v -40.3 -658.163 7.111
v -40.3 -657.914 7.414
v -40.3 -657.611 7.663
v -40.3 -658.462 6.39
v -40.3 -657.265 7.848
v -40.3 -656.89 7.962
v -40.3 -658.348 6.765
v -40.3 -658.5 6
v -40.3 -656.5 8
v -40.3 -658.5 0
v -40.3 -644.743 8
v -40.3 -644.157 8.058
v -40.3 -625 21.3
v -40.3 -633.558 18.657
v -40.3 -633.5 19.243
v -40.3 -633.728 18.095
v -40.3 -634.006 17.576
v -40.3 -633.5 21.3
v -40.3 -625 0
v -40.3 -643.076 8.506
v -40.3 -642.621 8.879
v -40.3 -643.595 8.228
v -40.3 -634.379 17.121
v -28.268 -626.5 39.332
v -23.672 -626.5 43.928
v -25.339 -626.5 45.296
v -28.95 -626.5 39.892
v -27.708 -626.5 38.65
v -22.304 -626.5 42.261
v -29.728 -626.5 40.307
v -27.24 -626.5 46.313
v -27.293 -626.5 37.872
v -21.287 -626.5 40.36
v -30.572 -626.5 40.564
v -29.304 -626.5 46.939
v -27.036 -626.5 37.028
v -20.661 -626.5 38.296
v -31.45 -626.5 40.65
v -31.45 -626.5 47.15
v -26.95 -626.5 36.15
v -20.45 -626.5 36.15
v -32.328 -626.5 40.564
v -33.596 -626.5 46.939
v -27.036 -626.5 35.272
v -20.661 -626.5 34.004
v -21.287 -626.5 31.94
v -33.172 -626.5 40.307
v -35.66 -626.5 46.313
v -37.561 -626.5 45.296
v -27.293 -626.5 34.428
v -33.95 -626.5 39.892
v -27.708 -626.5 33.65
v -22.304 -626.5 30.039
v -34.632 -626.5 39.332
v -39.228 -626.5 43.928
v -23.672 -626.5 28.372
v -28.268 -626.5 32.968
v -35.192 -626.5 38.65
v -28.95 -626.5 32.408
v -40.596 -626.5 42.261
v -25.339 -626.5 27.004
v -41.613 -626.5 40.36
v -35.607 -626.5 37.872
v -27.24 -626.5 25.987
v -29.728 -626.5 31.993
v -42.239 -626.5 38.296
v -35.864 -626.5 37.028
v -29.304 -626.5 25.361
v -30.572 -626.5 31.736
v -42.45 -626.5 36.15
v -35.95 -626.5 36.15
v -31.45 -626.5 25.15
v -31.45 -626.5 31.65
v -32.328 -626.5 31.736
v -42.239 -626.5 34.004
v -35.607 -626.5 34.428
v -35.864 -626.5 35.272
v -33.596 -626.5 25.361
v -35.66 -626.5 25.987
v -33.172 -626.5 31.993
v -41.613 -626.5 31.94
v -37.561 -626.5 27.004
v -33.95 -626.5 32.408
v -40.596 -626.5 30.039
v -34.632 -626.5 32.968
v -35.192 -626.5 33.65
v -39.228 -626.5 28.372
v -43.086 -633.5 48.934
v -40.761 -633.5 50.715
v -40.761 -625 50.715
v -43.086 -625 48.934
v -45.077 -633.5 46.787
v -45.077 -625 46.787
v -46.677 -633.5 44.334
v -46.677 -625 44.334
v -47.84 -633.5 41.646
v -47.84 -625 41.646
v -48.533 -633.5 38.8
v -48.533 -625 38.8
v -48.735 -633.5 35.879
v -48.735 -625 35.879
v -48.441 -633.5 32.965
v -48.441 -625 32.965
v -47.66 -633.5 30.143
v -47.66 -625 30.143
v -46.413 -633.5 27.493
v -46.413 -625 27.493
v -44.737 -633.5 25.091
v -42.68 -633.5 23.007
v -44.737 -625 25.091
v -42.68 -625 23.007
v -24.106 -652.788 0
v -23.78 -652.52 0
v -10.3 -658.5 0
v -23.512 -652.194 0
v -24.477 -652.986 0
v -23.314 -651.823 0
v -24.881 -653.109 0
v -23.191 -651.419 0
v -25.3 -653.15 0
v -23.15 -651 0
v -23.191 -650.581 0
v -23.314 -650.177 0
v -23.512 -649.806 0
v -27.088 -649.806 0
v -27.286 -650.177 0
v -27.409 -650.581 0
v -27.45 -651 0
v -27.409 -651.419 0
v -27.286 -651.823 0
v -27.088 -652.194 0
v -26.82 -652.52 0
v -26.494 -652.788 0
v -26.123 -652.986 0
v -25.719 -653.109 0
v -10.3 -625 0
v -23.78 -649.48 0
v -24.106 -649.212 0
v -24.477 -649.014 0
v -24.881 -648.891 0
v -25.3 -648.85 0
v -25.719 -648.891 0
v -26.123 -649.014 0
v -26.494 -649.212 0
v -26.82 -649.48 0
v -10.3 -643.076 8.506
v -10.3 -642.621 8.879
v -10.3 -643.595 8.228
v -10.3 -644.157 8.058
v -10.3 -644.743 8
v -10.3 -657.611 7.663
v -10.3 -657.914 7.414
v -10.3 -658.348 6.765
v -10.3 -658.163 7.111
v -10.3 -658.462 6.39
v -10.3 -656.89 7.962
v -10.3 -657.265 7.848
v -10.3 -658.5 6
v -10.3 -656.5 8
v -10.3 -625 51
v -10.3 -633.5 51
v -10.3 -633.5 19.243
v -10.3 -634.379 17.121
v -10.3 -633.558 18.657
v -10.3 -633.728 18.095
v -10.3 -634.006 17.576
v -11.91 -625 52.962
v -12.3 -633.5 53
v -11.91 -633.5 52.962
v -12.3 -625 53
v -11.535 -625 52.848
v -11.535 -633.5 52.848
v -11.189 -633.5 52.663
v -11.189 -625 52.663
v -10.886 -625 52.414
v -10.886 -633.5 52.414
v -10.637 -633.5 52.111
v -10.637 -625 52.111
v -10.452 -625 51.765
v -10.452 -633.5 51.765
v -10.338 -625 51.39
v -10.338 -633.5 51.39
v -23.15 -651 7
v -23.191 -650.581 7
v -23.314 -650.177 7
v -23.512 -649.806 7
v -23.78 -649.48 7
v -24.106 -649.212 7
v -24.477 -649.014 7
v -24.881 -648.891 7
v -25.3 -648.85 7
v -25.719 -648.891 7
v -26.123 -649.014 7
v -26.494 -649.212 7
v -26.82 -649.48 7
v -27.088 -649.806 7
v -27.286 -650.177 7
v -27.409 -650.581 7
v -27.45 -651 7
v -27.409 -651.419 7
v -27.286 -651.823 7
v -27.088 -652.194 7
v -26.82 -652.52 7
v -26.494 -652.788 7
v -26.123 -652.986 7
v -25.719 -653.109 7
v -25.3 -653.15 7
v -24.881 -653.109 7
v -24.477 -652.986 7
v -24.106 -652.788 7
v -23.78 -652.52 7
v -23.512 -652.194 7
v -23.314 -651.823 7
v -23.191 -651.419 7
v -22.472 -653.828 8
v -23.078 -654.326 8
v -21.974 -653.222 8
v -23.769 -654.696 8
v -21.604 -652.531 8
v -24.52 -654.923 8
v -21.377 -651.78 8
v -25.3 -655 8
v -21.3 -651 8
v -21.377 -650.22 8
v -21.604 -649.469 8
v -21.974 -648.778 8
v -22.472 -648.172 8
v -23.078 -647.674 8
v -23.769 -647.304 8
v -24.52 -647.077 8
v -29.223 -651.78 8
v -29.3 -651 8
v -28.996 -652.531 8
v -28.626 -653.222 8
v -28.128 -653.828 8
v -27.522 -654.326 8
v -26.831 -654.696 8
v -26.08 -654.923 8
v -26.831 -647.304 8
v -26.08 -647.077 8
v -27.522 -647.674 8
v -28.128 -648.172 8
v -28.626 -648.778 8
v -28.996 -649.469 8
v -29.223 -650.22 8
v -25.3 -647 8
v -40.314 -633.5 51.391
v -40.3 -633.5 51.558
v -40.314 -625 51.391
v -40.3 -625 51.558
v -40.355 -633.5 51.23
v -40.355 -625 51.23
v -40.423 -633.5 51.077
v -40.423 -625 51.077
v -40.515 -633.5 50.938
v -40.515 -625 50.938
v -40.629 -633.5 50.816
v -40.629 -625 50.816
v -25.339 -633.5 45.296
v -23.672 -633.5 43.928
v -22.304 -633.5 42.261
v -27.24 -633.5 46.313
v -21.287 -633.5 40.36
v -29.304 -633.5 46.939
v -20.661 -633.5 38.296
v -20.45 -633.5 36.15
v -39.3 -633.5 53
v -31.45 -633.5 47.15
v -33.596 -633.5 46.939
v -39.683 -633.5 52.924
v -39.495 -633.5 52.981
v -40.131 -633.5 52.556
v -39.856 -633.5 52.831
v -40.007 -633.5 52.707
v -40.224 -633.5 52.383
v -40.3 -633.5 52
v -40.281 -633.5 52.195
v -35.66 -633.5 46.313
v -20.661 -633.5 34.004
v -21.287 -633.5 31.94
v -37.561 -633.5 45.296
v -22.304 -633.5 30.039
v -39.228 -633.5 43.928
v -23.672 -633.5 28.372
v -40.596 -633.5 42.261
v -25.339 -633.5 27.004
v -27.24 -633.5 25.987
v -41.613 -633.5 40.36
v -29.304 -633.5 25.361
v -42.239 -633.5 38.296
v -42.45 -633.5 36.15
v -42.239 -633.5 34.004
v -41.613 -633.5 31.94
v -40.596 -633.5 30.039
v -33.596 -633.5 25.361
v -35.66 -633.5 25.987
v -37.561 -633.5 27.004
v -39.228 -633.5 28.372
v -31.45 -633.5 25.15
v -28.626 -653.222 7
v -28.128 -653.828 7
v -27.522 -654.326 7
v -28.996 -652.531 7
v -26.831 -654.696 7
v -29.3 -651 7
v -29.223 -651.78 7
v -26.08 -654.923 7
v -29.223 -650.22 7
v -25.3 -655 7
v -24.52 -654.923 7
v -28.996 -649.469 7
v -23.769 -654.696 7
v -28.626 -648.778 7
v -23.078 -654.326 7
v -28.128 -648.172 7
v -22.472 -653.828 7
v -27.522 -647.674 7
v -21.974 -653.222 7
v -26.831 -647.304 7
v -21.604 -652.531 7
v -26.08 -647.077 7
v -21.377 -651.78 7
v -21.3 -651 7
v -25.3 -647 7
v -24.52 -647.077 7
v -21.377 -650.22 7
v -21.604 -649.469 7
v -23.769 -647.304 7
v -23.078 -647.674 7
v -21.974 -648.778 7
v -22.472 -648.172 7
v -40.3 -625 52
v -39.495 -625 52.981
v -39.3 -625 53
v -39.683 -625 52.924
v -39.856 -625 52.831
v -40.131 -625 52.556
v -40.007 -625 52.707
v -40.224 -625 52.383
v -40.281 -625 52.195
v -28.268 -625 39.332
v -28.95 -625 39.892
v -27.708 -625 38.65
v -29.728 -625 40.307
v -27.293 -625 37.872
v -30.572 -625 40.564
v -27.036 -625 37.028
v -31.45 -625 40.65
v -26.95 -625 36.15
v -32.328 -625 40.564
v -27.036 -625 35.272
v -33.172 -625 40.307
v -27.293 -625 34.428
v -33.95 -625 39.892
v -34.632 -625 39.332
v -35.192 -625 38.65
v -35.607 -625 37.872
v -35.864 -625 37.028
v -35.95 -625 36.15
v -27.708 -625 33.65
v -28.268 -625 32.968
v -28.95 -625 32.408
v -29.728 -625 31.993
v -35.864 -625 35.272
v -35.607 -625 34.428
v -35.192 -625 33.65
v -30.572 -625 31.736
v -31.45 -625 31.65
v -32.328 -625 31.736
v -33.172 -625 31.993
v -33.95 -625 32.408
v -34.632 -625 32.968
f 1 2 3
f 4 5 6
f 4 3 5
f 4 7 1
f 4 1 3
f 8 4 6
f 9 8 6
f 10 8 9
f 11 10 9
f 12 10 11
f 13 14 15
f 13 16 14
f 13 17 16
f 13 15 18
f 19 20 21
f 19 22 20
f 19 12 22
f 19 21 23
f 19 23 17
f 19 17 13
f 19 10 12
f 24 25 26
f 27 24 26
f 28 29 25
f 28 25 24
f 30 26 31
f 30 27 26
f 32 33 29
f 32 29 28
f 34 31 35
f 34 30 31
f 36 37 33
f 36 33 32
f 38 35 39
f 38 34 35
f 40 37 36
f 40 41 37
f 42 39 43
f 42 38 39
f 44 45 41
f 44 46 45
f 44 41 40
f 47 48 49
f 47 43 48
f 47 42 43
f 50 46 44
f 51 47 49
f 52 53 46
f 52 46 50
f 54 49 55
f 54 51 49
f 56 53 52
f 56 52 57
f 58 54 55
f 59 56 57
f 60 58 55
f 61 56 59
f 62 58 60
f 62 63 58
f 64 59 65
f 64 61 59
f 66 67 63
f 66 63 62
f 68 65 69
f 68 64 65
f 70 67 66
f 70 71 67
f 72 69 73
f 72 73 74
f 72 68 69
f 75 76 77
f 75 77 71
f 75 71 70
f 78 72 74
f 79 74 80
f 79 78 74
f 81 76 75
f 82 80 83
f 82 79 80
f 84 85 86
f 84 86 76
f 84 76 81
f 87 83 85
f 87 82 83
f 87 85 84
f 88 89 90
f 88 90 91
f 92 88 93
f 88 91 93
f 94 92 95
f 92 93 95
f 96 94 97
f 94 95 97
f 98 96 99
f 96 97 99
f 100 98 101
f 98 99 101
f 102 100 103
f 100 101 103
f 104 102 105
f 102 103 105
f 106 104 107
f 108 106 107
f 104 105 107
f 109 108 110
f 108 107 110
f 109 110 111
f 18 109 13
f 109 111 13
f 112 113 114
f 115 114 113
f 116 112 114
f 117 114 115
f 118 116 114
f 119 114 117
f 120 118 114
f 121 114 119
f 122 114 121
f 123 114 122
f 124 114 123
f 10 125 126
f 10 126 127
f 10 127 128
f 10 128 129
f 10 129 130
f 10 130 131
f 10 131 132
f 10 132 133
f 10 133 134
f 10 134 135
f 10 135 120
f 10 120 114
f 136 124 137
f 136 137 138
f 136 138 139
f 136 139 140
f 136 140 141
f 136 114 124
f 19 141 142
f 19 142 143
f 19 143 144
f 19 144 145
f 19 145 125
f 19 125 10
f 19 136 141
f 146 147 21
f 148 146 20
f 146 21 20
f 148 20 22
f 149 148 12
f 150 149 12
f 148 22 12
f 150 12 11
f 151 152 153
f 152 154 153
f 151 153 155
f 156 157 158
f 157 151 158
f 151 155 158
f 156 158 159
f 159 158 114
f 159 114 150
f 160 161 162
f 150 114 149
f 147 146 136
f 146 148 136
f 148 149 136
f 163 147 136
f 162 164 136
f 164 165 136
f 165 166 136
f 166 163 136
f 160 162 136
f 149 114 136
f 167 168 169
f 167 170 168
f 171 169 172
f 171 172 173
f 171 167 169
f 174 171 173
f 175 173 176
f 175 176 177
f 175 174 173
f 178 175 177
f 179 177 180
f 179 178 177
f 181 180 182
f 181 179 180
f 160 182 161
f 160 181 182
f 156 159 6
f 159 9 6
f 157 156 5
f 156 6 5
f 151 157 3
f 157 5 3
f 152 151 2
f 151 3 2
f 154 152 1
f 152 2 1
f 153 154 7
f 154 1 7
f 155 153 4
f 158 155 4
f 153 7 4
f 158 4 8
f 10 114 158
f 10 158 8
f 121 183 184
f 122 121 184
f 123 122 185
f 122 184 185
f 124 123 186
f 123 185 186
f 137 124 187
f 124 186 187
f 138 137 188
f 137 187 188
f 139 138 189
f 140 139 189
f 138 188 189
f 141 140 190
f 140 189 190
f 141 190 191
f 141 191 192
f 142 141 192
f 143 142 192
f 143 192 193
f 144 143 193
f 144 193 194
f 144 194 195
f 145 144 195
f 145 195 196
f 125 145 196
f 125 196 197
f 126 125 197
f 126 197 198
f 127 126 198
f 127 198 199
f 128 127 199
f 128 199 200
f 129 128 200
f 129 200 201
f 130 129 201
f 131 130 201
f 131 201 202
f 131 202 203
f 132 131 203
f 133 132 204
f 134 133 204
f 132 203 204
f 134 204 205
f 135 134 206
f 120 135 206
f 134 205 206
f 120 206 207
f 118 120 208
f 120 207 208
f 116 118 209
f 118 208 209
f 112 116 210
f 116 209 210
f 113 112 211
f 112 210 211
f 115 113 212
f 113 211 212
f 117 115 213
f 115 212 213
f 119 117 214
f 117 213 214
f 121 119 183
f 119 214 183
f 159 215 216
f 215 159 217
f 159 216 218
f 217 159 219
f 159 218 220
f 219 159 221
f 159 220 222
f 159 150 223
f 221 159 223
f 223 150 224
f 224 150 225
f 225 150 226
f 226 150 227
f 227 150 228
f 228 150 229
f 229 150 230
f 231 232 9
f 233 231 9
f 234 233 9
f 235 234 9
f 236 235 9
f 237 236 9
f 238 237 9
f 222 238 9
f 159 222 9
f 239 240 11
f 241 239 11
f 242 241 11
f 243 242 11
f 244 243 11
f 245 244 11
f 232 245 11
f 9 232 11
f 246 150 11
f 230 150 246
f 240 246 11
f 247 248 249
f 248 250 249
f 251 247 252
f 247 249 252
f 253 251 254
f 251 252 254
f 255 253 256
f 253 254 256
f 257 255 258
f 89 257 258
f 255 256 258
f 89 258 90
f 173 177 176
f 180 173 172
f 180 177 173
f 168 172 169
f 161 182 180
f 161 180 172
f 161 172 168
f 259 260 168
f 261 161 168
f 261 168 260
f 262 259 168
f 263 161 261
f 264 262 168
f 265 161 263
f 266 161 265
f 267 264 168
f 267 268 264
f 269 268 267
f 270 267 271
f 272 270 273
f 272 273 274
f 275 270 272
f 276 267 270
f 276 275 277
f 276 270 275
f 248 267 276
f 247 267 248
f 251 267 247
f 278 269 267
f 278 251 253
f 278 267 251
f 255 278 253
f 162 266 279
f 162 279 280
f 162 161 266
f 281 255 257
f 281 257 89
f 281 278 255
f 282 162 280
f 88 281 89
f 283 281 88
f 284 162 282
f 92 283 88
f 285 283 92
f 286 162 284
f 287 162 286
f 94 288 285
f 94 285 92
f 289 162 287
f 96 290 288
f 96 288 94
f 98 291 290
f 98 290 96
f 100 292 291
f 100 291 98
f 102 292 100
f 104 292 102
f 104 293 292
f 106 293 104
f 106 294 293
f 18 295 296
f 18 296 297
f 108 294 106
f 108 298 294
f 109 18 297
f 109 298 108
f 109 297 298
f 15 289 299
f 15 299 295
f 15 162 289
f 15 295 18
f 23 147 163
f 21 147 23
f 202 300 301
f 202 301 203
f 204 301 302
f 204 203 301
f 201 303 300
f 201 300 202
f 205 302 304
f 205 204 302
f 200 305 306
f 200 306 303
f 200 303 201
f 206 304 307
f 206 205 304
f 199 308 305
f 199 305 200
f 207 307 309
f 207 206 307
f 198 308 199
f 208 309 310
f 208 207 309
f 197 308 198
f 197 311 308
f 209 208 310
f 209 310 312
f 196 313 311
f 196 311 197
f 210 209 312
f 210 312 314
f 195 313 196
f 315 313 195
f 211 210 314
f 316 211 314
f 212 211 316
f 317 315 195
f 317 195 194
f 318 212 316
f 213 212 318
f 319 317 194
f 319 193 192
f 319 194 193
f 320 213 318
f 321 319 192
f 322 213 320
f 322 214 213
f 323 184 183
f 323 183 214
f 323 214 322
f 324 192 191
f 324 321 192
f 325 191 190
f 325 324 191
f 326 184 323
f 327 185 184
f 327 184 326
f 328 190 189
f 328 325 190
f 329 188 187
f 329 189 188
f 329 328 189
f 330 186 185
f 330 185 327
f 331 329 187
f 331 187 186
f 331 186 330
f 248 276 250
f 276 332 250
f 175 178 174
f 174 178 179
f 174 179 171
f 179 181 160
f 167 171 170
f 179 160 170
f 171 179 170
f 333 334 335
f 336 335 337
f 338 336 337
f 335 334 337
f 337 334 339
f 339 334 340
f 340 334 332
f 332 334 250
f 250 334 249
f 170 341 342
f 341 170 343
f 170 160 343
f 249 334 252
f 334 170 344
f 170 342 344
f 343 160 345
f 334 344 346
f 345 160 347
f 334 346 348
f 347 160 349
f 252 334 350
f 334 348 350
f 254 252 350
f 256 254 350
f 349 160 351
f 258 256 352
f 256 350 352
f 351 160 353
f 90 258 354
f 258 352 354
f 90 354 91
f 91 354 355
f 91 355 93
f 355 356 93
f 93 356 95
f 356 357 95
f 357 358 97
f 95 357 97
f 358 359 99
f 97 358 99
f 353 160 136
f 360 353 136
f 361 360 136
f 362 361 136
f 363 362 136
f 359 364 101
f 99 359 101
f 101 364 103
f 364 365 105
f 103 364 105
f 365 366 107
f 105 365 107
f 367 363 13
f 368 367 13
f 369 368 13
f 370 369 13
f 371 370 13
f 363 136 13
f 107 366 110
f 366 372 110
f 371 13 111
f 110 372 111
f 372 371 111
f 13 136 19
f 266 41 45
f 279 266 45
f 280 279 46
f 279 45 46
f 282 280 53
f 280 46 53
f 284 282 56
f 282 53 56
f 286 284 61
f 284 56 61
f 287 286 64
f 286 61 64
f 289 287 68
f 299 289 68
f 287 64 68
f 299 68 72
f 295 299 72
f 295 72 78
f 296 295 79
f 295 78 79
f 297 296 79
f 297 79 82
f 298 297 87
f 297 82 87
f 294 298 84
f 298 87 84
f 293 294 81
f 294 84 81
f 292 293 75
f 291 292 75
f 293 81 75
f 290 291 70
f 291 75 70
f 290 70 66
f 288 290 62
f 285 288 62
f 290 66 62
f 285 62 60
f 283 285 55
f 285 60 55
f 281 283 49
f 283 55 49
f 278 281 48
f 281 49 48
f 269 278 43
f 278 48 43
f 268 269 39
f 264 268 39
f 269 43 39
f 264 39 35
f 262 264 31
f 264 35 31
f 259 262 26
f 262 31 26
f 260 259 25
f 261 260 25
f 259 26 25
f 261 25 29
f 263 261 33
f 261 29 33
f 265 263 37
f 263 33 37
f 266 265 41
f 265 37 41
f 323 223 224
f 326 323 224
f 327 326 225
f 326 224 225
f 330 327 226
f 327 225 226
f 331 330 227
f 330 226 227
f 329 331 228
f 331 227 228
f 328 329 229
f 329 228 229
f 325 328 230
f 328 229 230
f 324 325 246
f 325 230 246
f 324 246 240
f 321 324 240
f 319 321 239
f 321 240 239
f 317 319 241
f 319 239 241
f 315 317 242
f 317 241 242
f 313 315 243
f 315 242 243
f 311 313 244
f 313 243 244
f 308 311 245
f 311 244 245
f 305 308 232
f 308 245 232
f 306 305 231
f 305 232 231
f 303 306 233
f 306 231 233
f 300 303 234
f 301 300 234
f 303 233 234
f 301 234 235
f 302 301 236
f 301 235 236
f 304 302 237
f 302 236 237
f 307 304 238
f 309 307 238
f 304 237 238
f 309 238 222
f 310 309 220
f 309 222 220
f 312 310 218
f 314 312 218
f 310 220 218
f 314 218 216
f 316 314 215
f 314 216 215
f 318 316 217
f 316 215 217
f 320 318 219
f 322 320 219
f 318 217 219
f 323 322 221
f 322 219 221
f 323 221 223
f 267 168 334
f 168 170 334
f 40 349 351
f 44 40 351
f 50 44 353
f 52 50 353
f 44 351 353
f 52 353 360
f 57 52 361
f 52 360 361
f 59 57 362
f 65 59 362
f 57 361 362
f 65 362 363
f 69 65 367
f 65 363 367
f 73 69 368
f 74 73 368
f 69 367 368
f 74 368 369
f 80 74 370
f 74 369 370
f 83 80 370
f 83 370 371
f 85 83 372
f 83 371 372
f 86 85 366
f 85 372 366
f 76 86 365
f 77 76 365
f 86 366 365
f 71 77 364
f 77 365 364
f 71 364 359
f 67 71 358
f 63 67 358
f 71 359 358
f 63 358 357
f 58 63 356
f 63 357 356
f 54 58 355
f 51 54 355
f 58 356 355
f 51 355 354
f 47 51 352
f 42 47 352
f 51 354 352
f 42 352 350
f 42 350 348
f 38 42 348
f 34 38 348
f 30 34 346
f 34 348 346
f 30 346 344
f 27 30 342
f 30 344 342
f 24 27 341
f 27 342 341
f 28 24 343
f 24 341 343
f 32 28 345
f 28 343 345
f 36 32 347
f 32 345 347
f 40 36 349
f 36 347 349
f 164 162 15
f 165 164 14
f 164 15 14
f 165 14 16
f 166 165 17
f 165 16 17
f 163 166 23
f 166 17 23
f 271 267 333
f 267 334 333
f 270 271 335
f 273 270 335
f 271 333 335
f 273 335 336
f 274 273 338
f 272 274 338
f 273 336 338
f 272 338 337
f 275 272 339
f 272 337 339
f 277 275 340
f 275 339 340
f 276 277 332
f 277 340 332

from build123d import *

# Parameters (mm, degrees)
CROQUIS3_R              = 11
CROQUIS3_R_2            = 4.5
SALIENTE_EXTRUIR2_DEPTH = 1.5
SALIENTE_EXTRUIR3_START = -1.5
CROQUIS3_3_R            = 11
SALIENTE_EXTRUIR3_DEPTH = 7
CROQUIS4_W              = 30
CROQUIS4_H              = 25
SALIENTE_EXTRUIR4_DEPTH = 8
CHAFL_N1_SIZE           = 10
CROQUIS5_R              = 2.15
CORTAR_EXTRUIR1_DEPTH   = 9
REDONDEO1_R             = 1
REDONDEO2_R             = 2
REDONDEO3_R             = 3
REDONDEO4_R             = 2
CROQUIS5_3_R            = 4
CROQUIS5_3_R_2          = 2.15
CORTAR_EXTRUIR2_DEPTH   = 1


with BuildPart() as part:
    # Croquis3 → Saliente-Extruir2 (new body)
    with BuildSketch(Plane(origin=(0, -625, 0), x_dir=(1, 0, 0), z_dir=(0, 1, 0))):
        with BuildLine():
            ThreePointArc((-40.300000436, -51), (-48.73713438, -36.15), (-40.300000436, -21.3))
            Line((-40.300000436, -21.3), (-40.300000436, 0))
            Line((-40.300000436, 0), (-10.300000436, 0))
            Line((-10.300000436, 0), (-10.300000436, -53))
            Line((-10.300000436, -53), (-40.300000436, -53))
            Line((-40.300000436, -53), (-40.300000436, -51))
        make_face()
        with Locations((-31.450000436, -36.15)):
            Circle(CROQUIS3_R, mode=Mode.SUBTRACT)
        with Locations((-31.450000436, -36.15)):
            Circle(CROQUIS3_R)
        with Locations((-31.450000436, -36.15)):
            Circle(CROQUIS3_R_2, mode=Mode.SUBTRACT)
    extrude(amount=-SALIENTE_EXTRUIR2_DEPTH)

    # Croquis3<3> → Saliente-Extruir3 (add)
    with BuildSketch(Plane(origin=(0, -625, 0), x_dir=(1, 0, 0), z_dir=(0, 1, 0)).offset(SALIENTE_EXTRUIR3_START)):
        with BuildLine():
            ThreePointArc((-40.300000436, -51), (-48.73713438, -36.15), (-40.300000436, -21.3))
            Line((-40.300000436, -21.3), (-40.300000436, 0))
            Line((-40.300000436, 0), (-10.300000436, 0))
            Line((-10.300000436, 0), (-10.300000436, -53))
            Line((-10.300000436, -53), (-40.300000436, -53))
            Line((-40.300000436, -53), (-40.300000436, -51))
        make_face()
        with Locations((-31.450000436, -36.15)):
            Circle(CROQUIS3_3_R, mode=Mode.SUBTRACT)
    extrude(amount=-SALIENTE_EXTRUIR3_DEPTH)

    # Croquis4 → Saliente-Extruir4 (add)
    with BuildSketch(Plane(origin=(0, 0, 0), x_dir=(-1, 0, 0), z_dir=(0, 0, -1))):
        with Locations((25.300000436, -646)):
            Rectangle(CROQUIS4_W, CROQUIS4_H)
    extrude(amount=-SALIENTE_EXTRUIR4_DEPTH)

    # Chaflán1
    chafl_n1_edges = [part.edges().sort_by_distance(p)[0] for p in [
        (-25.300000436, -633.5, 8),
    ]]
    chamfer(chafl_n1_edges, length=CHAFL_N1_SIZE)

    # Croquis5 → Cortar-Extruir1 (cut, through all)
    with BuildSketch(Plane.XY.offset(8)):
        with Locations((-25.300000436, -651)):
            Circle(CROQUIS5_R)
    extrude(amount=-CORTAR_EXTRUIR1_DEPTH, mode=Mode.SUBTRACT)

    # Redondeo1
    redondeo1_edges = [part.edges().sort_by_distance(p)[0] for p in [
        (-40.300000436, -629.25, 53),
        (-40.300000436, -629.25, 51),
    ]]
    fillet(redondeo1_edges, radius=REDONDEO1_R)

    # Redondeo2
    redondeo2_edges = [part.edges().sort_by_distance(p)[0] for p in [
        (-10.300000436, -629.25, 53),
    ]]
    fillet(redondeo2_edges, radius=REDONDEO2_R)

    # Redondeo3
    redondeo3_edges = [part.edges().sort_by_distance(p)[0] for p in [
        (-25.300000436, -633.5, 18),
        (-25.300000436, -643.5, 8),
    ]]
    fillet(redondeo3_edges, radius=REDONDEO3_R)

    # Redondeo4
    redondeo4_edges = [part.edges().sort_by_distance(p)[0] for p in [
        (-25.300000436, -658.5, 8),
    ]]
    fillet(redondeo4_edges, radius=REDONDEO4_R)

    # Croquis5<3> → Cortar-Extruir2 (cut)
    with BuildSketch(Plane.XY.offset(8)):
        with Locations((-25.300000436, -651)):
            Circle(CROQUIS5_3_R)
        with Locations((-25.300000436, -651)):
            Circle(CROQUIS5_3_R_2, mode=Mode.SUBTRACT)
    extrude(amount=-CORTAR_EXTRUIR2_DEPTH, mode=Mode.SUBTRACT)


solid = part.part
